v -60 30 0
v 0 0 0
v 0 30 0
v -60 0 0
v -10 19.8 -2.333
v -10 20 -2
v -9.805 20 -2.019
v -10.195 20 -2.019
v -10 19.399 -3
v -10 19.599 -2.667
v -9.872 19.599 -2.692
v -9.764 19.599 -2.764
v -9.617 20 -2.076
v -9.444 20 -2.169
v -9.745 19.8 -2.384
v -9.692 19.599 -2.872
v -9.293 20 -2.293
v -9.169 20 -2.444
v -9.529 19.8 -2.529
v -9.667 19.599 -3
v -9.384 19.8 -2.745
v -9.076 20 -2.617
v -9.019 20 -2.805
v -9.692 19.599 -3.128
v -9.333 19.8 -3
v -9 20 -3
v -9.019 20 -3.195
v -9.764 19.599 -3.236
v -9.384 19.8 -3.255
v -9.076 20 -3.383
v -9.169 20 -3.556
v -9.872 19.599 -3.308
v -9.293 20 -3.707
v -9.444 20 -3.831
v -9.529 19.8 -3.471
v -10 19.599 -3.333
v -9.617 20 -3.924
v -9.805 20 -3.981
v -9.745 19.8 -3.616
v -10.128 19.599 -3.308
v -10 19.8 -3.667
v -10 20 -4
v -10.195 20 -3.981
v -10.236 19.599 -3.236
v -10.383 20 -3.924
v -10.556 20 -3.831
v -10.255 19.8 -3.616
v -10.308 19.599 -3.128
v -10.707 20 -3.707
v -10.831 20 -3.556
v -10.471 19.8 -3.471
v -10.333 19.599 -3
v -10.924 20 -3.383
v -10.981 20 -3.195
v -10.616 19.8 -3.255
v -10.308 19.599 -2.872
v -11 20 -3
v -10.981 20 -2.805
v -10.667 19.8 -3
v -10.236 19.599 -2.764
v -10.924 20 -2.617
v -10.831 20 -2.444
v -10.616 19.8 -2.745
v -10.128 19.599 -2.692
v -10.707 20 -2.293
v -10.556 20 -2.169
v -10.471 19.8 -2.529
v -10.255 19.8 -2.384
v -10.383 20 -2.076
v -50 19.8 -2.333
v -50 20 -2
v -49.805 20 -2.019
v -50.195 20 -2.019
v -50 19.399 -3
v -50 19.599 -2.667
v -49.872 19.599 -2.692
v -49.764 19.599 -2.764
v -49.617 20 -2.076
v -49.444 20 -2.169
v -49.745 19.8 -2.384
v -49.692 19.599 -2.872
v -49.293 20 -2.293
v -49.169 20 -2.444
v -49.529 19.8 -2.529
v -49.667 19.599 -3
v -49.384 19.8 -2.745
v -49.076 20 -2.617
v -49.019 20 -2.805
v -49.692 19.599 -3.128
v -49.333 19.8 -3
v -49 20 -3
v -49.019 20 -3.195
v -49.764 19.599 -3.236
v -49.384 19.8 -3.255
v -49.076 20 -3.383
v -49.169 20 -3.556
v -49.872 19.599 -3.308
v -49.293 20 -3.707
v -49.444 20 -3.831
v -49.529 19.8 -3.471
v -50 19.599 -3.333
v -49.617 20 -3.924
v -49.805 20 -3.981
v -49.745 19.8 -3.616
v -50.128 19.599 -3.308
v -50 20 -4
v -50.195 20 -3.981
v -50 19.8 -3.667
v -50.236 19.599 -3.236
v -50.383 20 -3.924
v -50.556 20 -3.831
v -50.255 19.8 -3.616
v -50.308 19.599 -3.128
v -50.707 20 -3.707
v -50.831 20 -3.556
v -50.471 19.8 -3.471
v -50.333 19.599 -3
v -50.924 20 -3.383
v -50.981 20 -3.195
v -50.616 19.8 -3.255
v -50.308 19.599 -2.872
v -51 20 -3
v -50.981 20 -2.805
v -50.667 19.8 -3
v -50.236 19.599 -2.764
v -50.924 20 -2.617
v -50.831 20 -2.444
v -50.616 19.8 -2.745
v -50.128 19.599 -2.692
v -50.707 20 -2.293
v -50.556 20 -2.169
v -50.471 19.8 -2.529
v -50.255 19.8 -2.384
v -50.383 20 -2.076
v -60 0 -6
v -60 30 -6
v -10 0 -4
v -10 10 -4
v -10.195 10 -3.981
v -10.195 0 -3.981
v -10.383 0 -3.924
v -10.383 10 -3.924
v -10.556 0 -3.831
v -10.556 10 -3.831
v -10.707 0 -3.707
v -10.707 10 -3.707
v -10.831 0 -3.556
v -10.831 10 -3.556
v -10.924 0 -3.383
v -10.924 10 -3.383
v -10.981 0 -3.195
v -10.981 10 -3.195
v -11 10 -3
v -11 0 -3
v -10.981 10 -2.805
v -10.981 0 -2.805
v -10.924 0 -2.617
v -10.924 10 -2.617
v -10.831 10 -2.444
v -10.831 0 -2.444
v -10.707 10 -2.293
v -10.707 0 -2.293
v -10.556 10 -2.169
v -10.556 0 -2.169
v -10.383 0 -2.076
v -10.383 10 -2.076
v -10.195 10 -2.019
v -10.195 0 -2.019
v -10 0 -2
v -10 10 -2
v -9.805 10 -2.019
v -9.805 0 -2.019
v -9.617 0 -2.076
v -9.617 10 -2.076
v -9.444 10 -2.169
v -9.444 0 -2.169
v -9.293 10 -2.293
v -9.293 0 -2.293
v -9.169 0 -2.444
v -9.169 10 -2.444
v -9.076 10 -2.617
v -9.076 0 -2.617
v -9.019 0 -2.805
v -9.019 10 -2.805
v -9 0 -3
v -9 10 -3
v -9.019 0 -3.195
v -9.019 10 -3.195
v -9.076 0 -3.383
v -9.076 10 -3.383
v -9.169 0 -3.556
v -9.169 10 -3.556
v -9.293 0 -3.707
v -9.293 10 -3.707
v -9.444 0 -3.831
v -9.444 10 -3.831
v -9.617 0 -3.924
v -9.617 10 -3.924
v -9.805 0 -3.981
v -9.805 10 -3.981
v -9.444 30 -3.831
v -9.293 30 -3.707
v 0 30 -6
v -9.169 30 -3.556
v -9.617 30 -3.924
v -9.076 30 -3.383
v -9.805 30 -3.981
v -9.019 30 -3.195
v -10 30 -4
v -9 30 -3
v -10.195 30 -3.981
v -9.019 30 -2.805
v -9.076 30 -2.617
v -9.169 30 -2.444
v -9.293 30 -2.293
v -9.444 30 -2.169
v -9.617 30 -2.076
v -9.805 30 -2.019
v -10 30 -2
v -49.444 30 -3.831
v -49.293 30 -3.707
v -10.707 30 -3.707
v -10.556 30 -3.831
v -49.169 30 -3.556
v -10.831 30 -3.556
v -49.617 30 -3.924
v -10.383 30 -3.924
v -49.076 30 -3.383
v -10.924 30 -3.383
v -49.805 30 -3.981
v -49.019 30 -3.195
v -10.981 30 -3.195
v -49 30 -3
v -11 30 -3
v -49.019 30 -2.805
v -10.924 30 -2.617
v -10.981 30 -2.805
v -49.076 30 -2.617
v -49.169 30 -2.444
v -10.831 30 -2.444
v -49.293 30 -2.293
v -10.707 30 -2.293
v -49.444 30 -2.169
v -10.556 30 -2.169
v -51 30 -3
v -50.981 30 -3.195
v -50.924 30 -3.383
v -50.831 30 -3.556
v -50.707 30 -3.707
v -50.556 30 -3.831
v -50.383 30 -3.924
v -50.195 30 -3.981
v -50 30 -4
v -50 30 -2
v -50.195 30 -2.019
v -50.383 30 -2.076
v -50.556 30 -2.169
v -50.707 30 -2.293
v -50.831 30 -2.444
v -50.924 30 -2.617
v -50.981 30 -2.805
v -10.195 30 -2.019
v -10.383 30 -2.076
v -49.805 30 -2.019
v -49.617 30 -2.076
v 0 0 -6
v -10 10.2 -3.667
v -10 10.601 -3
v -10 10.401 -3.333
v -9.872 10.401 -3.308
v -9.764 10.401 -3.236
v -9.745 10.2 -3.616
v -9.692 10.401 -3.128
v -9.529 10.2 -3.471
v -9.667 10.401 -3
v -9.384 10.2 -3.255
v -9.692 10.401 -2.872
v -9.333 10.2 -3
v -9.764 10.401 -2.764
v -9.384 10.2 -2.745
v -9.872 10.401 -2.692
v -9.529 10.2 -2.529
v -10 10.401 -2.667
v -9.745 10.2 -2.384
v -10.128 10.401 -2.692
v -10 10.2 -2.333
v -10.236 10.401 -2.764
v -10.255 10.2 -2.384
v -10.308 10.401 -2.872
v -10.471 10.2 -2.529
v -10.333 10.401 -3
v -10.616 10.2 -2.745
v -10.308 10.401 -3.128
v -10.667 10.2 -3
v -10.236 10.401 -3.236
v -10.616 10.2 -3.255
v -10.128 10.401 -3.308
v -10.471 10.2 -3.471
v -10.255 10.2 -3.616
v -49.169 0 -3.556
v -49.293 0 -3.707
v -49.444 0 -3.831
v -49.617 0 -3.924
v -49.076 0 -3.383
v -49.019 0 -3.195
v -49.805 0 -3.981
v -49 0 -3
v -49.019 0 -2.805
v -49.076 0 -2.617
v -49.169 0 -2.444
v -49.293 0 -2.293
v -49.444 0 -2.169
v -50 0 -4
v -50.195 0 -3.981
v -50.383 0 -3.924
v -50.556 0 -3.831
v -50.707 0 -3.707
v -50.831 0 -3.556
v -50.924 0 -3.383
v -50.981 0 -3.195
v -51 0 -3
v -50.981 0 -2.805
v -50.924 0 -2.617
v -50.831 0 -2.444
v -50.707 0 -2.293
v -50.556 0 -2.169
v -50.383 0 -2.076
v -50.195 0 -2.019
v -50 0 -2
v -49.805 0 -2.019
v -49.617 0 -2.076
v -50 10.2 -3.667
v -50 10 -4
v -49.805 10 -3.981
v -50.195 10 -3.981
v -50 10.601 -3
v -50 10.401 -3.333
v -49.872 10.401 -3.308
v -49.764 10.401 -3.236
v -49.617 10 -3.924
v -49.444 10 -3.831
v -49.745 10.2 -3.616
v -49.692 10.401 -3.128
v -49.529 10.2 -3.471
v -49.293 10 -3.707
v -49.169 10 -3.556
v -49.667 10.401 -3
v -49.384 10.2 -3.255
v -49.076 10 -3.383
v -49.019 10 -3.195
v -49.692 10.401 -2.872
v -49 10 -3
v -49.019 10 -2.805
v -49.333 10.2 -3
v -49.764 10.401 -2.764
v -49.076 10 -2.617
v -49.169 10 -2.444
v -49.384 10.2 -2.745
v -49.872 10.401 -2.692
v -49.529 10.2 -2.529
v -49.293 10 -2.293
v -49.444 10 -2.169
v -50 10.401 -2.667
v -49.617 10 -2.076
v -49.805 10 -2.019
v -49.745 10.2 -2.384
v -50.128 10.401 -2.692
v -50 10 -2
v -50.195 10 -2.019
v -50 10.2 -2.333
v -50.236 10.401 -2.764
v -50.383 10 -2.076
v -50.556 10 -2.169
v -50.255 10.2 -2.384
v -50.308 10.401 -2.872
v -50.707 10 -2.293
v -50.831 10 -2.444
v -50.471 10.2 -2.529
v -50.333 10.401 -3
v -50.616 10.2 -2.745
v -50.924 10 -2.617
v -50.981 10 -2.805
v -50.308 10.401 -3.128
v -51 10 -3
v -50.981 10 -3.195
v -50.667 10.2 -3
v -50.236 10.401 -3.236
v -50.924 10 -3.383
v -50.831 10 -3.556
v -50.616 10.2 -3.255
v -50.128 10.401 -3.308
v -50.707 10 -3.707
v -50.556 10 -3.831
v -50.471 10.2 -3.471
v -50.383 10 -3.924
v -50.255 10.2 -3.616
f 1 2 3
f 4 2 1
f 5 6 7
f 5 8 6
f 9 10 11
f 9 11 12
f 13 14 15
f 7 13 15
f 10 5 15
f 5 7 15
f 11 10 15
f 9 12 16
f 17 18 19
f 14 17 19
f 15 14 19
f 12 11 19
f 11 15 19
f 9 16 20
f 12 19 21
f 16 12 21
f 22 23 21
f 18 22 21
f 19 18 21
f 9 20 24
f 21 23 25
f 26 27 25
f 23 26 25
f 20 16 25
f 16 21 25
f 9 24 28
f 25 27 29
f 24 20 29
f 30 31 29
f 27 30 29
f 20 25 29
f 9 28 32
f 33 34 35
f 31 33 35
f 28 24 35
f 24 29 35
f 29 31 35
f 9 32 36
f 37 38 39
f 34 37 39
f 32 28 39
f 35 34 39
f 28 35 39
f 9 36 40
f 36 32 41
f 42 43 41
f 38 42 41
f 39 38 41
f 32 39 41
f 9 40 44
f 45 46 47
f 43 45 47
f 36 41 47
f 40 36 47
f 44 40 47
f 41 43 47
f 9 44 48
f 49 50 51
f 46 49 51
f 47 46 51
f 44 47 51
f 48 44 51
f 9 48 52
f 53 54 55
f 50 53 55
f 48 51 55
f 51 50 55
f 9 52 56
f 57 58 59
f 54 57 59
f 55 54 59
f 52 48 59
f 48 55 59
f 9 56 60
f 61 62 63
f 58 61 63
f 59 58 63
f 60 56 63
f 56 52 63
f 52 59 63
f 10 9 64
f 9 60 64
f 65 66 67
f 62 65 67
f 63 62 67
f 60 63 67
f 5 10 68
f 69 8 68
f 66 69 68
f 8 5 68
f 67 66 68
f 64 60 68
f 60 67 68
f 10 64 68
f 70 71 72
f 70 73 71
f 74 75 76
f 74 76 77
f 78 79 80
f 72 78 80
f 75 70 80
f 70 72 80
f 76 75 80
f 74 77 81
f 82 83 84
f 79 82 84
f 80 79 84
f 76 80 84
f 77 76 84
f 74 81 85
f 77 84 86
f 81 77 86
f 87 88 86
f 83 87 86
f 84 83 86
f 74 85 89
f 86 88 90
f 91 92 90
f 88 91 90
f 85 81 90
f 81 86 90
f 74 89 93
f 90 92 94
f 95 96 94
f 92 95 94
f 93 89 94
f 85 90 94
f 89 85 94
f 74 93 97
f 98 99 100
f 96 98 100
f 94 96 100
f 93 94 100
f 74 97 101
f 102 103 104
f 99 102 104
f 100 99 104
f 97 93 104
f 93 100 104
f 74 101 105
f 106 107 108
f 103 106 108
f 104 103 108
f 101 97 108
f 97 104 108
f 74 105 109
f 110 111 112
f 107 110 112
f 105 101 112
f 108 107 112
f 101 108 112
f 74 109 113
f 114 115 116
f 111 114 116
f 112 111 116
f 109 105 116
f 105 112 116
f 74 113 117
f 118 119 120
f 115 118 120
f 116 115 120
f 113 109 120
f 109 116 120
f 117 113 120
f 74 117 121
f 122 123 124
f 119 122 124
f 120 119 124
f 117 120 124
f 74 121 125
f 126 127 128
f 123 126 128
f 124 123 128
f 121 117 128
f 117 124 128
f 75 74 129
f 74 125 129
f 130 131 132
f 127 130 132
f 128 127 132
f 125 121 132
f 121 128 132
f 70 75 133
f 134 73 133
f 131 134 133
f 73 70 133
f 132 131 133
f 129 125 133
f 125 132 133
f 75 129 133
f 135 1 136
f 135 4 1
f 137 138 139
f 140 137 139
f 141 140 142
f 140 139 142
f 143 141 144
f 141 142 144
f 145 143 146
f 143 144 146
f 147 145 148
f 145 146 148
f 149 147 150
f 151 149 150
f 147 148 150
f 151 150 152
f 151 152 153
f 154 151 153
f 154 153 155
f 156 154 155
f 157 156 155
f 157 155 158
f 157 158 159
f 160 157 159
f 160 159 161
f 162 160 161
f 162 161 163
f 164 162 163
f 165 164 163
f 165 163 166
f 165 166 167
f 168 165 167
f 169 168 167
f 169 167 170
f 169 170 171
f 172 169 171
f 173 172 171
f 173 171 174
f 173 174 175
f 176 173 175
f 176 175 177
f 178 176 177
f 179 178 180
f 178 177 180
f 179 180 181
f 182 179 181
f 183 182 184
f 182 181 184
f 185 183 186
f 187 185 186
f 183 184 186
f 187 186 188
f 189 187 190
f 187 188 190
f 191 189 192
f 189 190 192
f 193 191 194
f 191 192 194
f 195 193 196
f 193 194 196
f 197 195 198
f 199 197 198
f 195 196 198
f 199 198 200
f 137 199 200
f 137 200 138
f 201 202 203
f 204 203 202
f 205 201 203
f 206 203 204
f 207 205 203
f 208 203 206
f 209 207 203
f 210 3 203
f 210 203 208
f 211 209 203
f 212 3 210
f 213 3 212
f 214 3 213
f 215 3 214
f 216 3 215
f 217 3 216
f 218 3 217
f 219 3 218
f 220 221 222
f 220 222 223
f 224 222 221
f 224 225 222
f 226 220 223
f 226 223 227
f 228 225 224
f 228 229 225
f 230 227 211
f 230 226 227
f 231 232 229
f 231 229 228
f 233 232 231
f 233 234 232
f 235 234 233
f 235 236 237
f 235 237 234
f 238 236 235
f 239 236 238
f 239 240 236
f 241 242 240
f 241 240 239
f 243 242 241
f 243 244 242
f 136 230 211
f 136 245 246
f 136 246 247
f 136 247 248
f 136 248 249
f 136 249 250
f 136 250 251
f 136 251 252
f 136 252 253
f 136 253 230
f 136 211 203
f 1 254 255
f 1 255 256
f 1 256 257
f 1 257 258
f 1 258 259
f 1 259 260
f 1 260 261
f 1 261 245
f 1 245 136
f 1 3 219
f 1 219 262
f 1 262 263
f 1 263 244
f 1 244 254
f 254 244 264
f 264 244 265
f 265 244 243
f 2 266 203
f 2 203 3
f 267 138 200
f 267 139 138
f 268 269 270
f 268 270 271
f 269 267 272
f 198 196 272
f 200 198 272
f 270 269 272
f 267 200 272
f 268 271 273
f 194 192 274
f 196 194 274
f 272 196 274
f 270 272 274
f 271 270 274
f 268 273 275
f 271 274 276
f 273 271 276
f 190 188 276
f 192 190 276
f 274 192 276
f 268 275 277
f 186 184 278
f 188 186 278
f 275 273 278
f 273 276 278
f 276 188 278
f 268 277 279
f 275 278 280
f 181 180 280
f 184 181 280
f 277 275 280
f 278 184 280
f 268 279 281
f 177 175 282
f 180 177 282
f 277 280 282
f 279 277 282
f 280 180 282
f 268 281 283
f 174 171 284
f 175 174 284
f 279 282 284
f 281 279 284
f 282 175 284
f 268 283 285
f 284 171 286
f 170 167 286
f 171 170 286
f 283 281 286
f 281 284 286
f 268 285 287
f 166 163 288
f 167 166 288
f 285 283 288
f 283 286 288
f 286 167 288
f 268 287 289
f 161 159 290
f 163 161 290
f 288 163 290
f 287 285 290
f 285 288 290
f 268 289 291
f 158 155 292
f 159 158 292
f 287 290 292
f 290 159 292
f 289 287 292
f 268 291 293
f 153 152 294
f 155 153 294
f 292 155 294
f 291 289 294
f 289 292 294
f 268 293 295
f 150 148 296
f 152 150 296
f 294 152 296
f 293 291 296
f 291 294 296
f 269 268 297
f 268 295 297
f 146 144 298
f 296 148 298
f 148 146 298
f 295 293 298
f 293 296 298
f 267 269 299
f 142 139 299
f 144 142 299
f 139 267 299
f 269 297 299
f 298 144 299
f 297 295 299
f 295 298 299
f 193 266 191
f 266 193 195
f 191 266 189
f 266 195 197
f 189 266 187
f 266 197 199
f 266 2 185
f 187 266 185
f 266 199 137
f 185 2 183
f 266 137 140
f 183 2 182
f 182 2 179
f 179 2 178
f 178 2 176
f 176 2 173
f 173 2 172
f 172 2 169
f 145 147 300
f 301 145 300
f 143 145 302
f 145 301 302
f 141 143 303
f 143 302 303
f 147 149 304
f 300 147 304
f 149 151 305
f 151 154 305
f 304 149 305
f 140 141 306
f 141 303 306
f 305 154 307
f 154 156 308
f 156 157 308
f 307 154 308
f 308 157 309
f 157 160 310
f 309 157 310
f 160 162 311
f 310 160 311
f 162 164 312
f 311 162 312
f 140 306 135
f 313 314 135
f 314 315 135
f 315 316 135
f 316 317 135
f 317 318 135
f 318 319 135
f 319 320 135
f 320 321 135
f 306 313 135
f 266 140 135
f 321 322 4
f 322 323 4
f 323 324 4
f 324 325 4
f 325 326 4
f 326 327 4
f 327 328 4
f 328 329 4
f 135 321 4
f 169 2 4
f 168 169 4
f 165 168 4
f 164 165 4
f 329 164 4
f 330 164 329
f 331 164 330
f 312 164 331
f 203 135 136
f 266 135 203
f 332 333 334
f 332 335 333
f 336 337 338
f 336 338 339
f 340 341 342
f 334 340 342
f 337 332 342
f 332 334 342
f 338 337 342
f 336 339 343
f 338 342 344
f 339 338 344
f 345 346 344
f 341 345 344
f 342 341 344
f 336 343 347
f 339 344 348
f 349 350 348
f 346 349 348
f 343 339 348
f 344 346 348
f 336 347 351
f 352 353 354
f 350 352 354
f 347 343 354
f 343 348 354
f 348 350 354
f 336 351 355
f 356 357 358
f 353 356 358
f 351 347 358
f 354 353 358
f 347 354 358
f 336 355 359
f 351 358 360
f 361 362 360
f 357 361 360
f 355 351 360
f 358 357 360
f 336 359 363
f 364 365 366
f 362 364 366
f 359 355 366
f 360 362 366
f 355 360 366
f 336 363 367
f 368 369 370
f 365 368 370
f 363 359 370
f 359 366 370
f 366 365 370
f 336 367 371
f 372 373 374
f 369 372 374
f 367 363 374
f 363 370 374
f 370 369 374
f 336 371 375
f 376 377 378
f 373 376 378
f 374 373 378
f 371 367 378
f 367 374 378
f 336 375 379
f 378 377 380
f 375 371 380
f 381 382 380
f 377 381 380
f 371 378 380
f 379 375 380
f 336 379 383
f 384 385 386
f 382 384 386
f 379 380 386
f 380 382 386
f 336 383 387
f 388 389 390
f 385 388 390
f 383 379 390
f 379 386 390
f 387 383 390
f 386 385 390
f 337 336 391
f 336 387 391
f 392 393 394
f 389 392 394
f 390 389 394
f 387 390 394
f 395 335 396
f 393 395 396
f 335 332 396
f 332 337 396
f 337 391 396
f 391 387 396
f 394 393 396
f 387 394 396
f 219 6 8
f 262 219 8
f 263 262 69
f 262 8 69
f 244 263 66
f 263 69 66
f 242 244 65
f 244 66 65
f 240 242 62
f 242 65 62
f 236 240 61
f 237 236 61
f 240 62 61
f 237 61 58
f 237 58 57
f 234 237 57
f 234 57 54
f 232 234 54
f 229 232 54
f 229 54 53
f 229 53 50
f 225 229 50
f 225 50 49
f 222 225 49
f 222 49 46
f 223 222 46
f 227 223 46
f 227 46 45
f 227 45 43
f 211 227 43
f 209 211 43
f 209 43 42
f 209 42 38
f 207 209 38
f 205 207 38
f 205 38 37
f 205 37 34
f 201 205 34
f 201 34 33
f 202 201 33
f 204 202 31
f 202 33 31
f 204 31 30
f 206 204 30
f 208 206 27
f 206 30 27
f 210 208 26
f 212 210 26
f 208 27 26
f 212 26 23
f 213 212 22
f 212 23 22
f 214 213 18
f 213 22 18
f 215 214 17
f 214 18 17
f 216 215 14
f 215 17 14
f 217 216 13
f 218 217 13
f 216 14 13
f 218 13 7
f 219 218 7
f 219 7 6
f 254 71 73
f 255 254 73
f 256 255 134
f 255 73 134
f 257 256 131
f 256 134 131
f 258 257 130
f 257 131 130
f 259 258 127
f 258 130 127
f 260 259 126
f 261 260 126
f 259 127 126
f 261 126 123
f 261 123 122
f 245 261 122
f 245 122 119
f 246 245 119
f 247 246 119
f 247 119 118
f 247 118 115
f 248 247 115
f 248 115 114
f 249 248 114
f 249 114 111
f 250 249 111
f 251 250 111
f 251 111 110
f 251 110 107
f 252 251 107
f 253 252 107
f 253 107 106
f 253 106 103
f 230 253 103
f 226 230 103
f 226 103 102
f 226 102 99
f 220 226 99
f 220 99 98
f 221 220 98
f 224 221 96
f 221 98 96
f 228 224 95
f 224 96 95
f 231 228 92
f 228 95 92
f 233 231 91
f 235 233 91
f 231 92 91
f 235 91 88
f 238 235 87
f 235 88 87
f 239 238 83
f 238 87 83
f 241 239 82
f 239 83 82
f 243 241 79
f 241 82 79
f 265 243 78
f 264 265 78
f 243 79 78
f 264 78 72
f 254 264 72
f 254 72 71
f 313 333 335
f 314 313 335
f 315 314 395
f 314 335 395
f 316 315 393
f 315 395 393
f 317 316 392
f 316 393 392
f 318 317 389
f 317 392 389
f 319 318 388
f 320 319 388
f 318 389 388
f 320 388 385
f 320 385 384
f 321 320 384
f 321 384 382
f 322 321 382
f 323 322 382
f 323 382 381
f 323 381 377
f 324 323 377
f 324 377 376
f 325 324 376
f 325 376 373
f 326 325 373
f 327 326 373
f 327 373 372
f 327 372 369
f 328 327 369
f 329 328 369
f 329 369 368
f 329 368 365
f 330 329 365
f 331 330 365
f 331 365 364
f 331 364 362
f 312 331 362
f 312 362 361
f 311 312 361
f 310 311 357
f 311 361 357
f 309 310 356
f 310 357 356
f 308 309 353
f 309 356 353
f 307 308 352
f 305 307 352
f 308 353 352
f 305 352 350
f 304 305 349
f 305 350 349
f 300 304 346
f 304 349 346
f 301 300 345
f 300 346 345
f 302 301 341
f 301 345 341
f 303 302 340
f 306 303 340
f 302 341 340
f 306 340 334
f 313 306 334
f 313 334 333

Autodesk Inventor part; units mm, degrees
ref_plane "YZ Plane" through (0, 0, 0) normal (1, 0, 0) x (0, 1, 0)
ref_plane "XZ Plane" through (0, 0, 0) normal (0, 1, 0) x (-1, 0, 0)
ref_plane "XY Plane" through (0, 0, 0) normal (0, 0, 1) x (1, 0, 0)
sketch "Skizze1" plane through (0, 0, 0) normal (0, 1, 0) x (-1, 0, 0)
  line L0 (0, 0) -> (60, 0)
  line L1 (60, 0) -> (60, -6)
  line L2 (60, -6) -> (0, -6)
  line L3 (0, -6) -> (0, 0)
  dimension "d0" = 60
  dimension "d1" = 6
extrude "Extrusion1" add sketch "Skizze1" along normal blind 30
sketch "m" plane through (0, 0, 0) normal (0, -1, 0) x (1, 0, 0)
  line L0 (0, -6) -> (0, 0) projected
  line L1 (-60, -6) -> (0, -6) projected
  point P0 (-10, -3)
  point P1 (-50, -3)
  dimension "d4" = 40
  dimension "d5" = 10
  dimension "d6" = 3
hole "Bohrung1" at (-10, 0, -3) at (-50, 0, -3) direction (0, 1, 0) diameter 2 depth 10 tip angle 118
sketch "Skizze3" plane through (0, 30, 0) normal (0, 1, 0) x (1, 0, 0)
  point P0 (0, 0)
  point P1 (-10, 3)
  point P2 (-50, 3)
hole "Bohrung2" at (-10, 30, -3) at (-50, 30, -3) direction (0, -1, 0) diameter 2 depth 10 tip angle 118
properties part number "AkkuHaltSeitenWand"
